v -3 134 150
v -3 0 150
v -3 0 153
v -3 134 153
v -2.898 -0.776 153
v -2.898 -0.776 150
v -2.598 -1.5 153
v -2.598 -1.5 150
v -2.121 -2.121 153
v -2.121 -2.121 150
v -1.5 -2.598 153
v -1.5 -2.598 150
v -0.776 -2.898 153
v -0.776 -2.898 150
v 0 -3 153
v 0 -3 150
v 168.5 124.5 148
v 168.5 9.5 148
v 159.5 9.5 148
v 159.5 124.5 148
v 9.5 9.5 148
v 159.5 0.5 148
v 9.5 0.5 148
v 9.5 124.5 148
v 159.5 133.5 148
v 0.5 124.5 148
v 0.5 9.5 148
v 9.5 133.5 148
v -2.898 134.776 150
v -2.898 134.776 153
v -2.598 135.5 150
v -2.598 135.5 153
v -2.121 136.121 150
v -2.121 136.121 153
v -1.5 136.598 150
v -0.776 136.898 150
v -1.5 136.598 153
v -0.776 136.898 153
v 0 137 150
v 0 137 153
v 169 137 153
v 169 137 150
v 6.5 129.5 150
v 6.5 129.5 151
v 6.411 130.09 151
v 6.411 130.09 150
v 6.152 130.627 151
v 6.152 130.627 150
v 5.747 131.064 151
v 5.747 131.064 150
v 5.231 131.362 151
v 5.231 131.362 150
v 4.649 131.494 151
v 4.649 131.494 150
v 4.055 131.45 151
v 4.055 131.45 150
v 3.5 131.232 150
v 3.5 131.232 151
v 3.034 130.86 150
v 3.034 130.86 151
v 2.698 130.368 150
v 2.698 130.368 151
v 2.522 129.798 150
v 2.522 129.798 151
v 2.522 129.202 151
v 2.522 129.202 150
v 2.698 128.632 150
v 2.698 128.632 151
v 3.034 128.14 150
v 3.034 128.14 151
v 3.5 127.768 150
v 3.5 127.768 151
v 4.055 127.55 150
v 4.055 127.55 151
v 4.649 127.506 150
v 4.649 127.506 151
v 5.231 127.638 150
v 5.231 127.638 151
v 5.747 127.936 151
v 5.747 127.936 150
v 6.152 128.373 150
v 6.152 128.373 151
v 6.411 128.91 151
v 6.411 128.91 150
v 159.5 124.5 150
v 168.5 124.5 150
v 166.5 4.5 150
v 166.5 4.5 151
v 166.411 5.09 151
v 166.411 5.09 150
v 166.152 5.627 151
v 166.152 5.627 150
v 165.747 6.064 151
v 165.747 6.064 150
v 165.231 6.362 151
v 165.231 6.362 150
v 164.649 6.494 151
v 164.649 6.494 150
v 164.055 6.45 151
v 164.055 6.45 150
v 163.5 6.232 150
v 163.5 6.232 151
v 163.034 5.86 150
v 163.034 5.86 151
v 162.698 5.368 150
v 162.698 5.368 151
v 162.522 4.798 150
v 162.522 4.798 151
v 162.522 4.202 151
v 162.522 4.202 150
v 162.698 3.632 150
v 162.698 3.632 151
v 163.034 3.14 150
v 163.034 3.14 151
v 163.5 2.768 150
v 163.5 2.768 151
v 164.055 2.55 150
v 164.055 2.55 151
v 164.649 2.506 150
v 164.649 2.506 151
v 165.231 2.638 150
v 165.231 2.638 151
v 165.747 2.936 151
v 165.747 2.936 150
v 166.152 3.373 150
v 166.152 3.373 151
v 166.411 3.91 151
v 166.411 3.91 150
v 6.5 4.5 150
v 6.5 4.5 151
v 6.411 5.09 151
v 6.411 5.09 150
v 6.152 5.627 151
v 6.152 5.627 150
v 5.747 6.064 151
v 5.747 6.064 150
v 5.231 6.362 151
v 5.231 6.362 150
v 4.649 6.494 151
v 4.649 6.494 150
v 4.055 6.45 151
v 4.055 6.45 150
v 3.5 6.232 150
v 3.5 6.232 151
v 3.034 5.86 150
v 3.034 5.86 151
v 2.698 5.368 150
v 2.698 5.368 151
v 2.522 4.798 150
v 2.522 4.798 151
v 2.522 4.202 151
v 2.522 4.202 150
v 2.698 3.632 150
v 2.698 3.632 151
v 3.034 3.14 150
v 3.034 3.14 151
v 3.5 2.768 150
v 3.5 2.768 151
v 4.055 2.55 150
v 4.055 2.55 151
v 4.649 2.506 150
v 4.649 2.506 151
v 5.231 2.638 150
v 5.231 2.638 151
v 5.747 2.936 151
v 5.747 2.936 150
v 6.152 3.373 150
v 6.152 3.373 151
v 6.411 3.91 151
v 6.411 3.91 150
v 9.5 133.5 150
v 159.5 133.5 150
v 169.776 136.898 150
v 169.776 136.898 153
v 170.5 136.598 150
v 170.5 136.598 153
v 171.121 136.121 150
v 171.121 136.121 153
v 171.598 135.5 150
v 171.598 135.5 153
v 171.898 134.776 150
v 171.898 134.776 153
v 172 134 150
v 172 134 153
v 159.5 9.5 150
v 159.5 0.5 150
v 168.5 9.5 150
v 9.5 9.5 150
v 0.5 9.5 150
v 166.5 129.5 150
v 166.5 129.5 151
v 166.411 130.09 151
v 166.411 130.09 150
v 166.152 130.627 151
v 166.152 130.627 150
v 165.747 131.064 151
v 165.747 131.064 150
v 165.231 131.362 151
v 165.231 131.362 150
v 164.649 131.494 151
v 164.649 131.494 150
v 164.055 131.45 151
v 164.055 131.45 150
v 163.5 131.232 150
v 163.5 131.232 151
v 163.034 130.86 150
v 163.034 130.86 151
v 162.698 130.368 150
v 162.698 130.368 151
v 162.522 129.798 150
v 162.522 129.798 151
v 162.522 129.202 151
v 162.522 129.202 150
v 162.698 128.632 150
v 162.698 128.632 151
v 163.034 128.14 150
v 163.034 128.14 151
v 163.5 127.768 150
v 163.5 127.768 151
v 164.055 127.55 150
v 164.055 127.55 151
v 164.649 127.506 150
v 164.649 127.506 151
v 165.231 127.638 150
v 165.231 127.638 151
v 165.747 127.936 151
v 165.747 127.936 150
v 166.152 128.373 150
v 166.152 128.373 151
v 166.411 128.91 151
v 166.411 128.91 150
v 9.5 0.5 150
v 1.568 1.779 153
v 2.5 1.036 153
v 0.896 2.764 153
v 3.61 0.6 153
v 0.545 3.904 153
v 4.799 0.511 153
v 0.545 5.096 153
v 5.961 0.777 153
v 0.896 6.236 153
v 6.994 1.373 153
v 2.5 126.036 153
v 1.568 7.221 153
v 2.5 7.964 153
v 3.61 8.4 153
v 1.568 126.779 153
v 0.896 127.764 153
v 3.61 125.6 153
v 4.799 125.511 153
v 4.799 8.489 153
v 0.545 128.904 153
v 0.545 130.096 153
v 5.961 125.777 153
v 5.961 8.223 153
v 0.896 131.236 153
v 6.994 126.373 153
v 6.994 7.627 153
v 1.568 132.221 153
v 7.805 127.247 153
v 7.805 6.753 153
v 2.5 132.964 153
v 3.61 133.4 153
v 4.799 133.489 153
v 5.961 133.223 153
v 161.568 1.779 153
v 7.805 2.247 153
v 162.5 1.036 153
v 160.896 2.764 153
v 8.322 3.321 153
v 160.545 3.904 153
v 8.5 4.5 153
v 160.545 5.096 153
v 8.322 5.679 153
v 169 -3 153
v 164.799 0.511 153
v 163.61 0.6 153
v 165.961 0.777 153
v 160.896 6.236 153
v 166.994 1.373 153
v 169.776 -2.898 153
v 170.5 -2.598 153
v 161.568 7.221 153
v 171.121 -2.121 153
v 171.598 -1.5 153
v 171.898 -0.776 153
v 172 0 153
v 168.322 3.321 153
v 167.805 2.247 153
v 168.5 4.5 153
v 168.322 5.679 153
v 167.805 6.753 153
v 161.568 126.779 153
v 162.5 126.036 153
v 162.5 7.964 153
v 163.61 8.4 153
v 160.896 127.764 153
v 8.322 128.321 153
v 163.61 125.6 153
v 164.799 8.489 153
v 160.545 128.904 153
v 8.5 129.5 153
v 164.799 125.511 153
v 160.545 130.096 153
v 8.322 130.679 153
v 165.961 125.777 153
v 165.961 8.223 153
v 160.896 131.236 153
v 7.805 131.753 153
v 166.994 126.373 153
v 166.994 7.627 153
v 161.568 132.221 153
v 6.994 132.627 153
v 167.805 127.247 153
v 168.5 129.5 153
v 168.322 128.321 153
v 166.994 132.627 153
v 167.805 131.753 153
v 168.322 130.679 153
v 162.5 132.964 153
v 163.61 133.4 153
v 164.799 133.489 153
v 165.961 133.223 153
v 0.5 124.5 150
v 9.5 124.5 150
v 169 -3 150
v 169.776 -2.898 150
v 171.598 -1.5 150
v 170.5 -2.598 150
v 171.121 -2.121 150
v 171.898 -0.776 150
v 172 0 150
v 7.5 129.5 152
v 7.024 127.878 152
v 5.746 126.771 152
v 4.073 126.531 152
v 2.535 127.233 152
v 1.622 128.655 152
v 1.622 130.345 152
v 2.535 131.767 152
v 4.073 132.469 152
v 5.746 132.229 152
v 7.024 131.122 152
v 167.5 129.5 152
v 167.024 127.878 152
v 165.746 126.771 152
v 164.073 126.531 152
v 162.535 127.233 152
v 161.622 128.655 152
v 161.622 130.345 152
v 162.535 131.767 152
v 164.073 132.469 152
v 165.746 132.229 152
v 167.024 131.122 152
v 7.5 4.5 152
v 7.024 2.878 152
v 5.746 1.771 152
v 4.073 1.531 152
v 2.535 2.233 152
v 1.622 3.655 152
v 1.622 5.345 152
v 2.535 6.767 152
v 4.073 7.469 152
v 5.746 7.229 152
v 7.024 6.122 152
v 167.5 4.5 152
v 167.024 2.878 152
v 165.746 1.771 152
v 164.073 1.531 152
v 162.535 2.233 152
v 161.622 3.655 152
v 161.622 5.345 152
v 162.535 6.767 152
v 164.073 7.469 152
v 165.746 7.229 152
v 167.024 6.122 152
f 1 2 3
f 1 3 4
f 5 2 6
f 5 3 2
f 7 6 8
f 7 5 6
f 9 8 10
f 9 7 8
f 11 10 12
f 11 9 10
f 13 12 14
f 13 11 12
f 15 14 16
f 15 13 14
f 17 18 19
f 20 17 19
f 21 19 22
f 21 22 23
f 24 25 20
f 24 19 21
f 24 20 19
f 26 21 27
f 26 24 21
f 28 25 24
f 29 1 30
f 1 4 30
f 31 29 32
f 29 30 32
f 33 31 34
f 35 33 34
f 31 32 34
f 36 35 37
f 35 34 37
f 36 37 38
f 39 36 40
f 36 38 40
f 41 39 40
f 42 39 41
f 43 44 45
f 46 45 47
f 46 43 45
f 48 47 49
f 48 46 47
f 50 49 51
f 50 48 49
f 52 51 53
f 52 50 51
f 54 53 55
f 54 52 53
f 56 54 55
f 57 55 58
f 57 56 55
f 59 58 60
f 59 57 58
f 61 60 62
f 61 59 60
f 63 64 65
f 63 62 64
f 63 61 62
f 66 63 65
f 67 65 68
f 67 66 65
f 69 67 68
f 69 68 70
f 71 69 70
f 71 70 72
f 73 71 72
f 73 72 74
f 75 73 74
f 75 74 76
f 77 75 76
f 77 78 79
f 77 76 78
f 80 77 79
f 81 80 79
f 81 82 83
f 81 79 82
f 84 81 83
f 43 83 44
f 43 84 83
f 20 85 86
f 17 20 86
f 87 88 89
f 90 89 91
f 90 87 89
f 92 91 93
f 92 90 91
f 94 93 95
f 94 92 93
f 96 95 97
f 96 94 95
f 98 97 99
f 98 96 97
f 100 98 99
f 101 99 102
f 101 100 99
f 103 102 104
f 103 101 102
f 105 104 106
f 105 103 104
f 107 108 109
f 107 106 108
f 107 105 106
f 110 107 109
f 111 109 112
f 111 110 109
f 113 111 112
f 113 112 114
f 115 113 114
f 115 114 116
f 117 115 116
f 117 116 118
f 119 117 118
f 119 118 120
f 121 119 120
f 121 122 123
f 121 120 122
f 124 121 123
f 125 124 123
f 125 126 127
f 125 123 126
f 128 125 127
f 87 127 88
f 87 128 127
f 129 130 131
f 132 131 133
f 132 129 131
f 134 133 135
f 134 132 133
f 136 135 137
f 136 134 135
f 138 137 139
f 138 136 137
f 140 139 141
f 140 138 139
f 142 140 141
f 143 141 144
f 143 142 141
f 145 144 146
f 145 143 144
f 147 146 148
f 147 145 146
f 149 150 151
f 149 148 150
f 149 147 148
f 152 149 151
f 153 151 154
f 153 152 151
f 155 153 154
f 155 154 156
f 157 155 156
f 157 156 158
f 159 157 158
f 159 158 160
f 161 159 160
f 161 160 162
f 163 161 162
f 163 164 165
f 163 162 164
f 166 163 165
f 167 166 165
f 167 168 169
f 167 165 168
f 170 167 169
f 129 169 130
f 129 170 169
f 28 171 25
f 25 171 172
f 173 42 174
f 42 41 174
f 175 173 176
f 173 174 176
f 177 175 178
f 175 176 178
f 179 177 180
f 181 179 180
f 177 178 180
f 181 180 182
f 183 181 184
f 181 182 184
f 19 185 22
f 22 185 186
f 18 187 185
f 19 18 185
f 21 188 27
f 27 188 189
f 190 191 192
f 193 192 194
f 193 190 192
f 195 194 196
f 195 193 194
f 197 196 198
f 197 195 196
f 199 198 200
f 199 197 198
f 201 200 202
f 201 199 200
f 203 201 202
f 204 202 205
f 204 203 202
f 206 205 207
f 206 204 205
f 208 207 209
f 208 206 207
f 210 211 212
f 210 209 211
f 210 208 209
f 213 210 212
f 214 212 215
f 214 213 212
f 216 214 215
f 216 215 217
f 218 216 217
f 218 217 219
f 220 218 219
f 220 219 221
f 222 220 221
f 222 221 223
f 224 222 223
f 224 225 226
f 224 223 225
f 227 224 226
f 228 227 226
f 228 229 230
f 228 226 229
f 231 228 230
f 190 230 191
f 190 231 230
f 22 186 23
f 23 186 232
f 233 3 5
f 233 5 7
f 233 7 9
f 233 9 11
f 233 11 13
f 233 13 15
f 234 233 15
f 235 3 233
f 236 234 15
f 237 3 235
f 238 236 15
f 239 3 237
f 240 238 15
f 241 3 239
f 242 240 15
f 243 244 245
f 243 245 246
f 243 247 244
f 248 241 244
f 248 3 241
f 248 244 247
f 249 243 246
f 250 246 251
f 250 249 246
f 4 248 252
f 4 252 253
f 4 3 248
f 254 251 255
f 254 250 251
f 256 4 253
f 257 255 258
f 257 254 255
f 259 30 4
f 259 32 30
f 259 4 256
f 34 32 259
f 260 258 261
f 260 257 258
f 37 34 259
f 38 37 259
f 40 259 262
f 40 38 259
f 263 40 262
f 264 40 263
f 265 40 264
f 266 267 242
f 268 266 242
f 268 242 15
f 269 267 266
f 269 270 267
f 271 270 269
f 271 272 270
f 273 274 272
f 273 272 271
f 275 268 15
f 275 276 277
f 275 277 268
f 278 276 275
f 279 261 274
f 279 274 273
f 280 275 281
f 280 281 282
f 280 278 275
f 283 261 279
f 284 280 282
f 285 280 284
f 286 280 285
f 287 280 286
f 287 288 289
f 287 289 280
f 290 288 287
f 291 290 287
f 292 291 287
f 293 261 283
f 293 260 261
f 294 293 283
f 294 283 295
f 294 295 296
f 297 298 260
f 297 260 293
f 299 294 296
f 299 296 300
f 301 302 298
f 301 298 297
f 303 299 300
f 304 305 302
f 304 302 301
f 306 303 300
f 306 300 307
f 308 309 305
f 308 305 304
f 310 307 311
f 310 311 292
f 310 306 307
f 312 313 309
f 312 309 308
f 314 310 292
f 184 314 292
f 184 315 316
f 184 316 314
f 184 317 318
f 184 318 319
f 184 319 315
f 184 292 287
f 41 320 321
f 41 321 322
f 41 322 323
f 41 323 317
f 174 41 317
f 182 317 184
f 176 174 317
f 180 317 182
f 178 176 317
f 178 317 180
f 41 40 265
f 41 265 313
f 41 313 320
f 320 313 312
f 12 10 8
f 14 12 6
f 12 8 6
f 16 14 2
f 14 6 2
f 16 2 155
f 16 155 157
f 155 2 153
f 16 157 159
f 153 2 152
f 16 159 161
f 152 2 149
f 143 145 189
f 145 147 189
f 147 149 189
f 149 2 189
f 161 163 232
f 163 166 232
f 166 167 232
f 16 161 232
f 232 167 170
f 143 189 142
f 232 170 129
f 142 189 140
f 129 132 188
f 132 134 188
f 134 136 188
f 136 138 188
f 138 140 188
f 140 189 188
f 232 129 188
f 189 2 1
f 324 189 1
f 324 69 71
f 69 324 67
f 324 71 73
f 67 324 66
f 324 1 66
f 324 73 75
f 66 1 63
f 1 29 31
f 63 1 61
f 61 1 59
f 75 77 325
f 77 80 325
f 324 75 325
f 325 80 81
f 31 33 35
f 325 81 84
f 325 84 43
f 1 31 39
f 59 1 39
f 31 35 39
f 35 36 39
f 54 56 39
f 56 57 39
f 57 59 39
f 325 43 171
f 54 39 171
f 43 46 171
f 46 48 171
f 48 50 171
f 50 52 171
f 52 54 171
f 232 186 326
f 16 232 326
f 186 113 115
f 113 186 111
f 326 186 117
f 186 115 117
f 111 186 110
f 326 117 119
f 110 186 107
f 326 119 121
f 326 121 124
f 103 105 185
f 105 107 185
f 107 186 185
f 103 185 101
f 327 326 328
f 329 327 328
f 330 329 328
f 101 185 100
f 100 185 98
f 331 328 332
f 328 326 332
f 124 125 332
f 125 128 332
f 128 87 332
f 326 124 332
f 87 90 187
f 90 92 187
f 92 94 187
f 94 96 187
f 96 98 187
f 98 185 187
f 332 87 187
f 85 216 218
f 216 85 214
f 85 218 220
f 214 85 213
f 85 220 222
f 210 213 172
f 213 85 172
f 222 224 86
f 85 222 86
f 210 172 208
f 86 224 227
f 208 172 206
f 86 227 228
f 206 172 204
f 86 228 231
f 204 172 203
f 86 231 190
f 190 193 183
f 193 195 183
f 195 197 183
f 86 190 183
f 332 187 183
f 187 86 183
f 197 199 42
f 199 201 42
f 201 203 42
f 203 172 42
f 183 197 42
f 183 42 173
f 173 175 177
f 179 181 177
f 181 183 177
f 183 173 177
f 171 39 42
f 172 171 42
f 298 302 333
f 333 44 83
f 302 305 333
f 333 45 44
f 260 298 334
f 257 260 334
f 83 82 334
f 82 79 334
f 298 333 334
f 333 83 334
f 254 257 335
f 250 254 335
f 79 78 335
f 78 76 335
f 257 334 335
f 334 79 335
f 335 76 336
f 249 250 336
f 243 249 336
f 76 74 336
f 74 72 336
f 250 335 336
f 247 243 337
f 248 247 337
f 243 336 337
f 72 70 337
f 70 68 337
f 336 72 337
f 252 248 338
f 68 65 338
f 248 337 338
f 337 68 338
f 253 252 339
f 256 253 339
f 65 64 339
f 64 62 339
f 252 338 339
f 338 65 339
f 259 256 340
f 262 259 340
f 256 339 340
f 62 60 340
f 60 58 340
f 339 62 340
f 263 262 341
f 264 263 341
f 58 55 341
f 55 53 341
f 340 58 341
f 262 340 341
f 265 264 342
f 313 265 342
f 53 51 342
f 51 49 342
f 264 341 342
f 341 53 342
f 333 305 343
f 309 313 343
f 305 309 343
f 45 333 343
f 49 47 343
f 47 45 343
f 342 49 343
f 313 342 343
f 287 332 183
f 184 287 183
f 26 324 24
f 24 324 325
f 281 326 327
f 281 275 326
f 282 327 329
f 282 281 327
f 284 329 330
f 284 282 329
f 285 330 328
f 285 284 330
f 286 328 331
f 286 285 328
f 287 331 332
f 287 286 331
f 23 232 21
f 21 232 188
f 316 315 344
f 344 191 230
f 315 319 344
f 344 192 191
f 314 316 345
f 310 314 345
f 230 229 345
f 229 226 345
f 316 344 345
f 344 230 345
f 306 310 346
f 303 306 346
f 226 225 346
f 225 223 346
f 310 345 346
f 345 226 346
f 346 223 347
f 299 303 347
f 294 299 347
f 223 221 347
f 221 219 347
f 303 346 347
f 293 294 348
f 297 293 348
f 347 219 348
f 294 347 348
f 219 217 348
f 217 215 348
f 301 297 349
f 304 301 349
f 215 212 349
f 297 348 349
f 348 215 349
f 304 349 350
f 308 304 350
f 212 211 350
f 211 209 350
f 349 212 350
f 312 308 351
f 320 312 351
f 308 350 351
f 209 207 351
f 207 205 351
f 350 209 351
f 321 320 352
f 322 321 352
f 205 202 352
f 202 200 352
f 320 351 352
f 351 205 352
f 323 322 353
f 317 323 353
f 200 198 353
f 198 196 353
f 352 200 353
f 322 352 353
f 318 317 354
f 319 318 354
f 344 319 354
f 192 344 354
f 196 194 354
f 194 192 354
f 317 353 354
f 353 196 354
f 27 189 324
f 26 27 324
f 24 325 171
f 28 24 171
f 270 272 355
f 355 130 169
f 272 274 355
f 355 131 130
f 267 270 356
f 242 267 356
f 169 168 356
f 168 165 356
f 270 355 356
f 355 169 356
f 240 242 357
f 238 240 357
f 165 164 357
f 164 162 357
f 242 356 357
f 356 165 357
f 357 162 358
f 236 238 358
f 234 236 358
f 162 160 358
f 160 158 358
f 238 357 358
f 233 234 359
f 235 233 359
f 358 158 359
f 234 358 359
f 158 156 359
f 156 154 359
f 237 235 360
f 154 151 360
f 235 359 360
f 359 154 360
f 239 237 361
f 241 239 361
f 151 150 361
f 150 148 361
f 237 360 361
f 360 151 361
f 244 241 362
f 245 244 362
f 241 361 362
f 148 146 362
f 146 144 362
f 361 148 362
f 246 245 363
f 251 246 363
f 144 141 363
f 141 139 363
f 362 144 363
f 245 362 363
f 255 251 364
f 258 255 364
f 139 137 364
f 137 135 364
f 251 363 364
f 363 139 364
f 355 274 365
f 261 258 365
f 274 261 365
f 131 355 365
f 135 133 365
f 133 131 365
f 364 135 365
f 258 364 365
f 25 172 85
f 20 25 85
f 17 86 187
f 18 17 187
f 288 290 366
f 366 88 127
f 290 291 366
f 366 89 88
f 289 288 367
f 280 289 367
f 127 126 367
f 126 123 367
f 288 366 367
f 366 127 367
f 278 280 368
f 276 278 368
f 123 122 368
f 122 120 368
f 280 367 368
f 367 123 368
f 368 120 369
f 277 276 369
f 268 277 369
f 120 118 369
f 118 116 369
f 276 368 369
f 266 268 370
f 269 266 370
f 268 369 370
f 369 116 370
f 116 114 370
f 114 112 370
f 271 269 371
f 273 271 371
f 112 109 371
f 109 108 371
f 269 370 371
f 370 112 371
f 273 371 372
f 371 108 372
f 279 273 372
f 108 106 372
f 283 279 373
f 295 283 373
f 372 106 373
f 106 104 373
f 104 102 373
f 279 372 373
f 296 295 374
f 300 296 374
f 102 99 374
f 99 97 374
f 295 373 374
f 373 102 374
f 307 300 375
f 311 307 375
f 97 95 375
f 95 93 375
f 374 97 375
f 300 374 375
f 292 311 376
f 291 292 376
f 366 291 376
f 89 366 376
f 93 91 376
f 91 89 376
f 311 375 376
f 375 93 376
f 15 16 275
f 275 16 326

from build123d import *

# Parameters (mm, degrees)
SKETCH008_W     = 175
SKETCH008_H     = 140
PAD002_DEPTH    = 3
PAD003_DEPTH    = 2
SKETCH010_R     = 2
POCKET006_DEPTH = 3.001
CHAMFER001_SIZE = 2
FILLET001_R     = 3


with BuildPart() as part:
    # Sketch008 → Pad002 (new body)
    with BuildSketch(Plane.XY):
        with Locations((84.5, 67)):
            Rectangle(SKETCH008_W, SKETCH008_H)
    extrude(amount=PAD002_DEPTH)

    # Sketch009 → Pad003 (join)
    with BuildSketch(Plane.XY):
        Polygon((0.5, 9.5), (0.5, 124.5), (9.5, 124.5), (9.5, 133.5), (159.5, 133.5), (159.5, 124.5), (168.5, 124.5), (168.5, 9.5), (159.5, 9.5), (159.5, 0.5), (9.5, 0.5), (9.5, 9.5), align=None)
    extrude(amount=-PAD003_DEPTH)

    # Sketch010 → Pocket006 (cut, through all)
    with BuildSketch(Plane.XY):
        with Locations((4.5, 4.5)):
            Circle(SKETCH010_R)
        with Locations((164.5, 129.5)):
            Circle(SKETCH010_R)
        with Locations((164.5, 4.5)):
            Circle(SKETCH010_R)
        with Locations((4.5, 129.5)):
            Circle(SKETCH010_R)
    extrude(amount=POCKET006_DEPTH, mode=Mode.SUBTRACT)

    # Chamfer001
    chamfer001_edges = [part.edges().sort_by_distance(p)[0] for p in [
        (2.5, 129.5, 3),
        (162.5, 129.5, 3),
        (162.5, 4.5, 3),
        (2.5, 4.5, 3),
    ]]
    chamfer(chamfer001_edges, length=CHAMFER001_SIZE)

    # Fillet001
    fillet001_edges = [part.edges().sort_by_distance(p)[0] for p in [
        (172, -3, 1.5),
        (172, 137, 1.5),
        (-3, -3, 1.5),
        (-3, 137, 1.5),
    ]]
    fillet(fillet001_edges, radius=FILLET001_R)


with BuildPart() as part_1:
    # Body placement: moved
    add(part.part.moved(Location((0, 0, 150))))


solid = part_1.part
